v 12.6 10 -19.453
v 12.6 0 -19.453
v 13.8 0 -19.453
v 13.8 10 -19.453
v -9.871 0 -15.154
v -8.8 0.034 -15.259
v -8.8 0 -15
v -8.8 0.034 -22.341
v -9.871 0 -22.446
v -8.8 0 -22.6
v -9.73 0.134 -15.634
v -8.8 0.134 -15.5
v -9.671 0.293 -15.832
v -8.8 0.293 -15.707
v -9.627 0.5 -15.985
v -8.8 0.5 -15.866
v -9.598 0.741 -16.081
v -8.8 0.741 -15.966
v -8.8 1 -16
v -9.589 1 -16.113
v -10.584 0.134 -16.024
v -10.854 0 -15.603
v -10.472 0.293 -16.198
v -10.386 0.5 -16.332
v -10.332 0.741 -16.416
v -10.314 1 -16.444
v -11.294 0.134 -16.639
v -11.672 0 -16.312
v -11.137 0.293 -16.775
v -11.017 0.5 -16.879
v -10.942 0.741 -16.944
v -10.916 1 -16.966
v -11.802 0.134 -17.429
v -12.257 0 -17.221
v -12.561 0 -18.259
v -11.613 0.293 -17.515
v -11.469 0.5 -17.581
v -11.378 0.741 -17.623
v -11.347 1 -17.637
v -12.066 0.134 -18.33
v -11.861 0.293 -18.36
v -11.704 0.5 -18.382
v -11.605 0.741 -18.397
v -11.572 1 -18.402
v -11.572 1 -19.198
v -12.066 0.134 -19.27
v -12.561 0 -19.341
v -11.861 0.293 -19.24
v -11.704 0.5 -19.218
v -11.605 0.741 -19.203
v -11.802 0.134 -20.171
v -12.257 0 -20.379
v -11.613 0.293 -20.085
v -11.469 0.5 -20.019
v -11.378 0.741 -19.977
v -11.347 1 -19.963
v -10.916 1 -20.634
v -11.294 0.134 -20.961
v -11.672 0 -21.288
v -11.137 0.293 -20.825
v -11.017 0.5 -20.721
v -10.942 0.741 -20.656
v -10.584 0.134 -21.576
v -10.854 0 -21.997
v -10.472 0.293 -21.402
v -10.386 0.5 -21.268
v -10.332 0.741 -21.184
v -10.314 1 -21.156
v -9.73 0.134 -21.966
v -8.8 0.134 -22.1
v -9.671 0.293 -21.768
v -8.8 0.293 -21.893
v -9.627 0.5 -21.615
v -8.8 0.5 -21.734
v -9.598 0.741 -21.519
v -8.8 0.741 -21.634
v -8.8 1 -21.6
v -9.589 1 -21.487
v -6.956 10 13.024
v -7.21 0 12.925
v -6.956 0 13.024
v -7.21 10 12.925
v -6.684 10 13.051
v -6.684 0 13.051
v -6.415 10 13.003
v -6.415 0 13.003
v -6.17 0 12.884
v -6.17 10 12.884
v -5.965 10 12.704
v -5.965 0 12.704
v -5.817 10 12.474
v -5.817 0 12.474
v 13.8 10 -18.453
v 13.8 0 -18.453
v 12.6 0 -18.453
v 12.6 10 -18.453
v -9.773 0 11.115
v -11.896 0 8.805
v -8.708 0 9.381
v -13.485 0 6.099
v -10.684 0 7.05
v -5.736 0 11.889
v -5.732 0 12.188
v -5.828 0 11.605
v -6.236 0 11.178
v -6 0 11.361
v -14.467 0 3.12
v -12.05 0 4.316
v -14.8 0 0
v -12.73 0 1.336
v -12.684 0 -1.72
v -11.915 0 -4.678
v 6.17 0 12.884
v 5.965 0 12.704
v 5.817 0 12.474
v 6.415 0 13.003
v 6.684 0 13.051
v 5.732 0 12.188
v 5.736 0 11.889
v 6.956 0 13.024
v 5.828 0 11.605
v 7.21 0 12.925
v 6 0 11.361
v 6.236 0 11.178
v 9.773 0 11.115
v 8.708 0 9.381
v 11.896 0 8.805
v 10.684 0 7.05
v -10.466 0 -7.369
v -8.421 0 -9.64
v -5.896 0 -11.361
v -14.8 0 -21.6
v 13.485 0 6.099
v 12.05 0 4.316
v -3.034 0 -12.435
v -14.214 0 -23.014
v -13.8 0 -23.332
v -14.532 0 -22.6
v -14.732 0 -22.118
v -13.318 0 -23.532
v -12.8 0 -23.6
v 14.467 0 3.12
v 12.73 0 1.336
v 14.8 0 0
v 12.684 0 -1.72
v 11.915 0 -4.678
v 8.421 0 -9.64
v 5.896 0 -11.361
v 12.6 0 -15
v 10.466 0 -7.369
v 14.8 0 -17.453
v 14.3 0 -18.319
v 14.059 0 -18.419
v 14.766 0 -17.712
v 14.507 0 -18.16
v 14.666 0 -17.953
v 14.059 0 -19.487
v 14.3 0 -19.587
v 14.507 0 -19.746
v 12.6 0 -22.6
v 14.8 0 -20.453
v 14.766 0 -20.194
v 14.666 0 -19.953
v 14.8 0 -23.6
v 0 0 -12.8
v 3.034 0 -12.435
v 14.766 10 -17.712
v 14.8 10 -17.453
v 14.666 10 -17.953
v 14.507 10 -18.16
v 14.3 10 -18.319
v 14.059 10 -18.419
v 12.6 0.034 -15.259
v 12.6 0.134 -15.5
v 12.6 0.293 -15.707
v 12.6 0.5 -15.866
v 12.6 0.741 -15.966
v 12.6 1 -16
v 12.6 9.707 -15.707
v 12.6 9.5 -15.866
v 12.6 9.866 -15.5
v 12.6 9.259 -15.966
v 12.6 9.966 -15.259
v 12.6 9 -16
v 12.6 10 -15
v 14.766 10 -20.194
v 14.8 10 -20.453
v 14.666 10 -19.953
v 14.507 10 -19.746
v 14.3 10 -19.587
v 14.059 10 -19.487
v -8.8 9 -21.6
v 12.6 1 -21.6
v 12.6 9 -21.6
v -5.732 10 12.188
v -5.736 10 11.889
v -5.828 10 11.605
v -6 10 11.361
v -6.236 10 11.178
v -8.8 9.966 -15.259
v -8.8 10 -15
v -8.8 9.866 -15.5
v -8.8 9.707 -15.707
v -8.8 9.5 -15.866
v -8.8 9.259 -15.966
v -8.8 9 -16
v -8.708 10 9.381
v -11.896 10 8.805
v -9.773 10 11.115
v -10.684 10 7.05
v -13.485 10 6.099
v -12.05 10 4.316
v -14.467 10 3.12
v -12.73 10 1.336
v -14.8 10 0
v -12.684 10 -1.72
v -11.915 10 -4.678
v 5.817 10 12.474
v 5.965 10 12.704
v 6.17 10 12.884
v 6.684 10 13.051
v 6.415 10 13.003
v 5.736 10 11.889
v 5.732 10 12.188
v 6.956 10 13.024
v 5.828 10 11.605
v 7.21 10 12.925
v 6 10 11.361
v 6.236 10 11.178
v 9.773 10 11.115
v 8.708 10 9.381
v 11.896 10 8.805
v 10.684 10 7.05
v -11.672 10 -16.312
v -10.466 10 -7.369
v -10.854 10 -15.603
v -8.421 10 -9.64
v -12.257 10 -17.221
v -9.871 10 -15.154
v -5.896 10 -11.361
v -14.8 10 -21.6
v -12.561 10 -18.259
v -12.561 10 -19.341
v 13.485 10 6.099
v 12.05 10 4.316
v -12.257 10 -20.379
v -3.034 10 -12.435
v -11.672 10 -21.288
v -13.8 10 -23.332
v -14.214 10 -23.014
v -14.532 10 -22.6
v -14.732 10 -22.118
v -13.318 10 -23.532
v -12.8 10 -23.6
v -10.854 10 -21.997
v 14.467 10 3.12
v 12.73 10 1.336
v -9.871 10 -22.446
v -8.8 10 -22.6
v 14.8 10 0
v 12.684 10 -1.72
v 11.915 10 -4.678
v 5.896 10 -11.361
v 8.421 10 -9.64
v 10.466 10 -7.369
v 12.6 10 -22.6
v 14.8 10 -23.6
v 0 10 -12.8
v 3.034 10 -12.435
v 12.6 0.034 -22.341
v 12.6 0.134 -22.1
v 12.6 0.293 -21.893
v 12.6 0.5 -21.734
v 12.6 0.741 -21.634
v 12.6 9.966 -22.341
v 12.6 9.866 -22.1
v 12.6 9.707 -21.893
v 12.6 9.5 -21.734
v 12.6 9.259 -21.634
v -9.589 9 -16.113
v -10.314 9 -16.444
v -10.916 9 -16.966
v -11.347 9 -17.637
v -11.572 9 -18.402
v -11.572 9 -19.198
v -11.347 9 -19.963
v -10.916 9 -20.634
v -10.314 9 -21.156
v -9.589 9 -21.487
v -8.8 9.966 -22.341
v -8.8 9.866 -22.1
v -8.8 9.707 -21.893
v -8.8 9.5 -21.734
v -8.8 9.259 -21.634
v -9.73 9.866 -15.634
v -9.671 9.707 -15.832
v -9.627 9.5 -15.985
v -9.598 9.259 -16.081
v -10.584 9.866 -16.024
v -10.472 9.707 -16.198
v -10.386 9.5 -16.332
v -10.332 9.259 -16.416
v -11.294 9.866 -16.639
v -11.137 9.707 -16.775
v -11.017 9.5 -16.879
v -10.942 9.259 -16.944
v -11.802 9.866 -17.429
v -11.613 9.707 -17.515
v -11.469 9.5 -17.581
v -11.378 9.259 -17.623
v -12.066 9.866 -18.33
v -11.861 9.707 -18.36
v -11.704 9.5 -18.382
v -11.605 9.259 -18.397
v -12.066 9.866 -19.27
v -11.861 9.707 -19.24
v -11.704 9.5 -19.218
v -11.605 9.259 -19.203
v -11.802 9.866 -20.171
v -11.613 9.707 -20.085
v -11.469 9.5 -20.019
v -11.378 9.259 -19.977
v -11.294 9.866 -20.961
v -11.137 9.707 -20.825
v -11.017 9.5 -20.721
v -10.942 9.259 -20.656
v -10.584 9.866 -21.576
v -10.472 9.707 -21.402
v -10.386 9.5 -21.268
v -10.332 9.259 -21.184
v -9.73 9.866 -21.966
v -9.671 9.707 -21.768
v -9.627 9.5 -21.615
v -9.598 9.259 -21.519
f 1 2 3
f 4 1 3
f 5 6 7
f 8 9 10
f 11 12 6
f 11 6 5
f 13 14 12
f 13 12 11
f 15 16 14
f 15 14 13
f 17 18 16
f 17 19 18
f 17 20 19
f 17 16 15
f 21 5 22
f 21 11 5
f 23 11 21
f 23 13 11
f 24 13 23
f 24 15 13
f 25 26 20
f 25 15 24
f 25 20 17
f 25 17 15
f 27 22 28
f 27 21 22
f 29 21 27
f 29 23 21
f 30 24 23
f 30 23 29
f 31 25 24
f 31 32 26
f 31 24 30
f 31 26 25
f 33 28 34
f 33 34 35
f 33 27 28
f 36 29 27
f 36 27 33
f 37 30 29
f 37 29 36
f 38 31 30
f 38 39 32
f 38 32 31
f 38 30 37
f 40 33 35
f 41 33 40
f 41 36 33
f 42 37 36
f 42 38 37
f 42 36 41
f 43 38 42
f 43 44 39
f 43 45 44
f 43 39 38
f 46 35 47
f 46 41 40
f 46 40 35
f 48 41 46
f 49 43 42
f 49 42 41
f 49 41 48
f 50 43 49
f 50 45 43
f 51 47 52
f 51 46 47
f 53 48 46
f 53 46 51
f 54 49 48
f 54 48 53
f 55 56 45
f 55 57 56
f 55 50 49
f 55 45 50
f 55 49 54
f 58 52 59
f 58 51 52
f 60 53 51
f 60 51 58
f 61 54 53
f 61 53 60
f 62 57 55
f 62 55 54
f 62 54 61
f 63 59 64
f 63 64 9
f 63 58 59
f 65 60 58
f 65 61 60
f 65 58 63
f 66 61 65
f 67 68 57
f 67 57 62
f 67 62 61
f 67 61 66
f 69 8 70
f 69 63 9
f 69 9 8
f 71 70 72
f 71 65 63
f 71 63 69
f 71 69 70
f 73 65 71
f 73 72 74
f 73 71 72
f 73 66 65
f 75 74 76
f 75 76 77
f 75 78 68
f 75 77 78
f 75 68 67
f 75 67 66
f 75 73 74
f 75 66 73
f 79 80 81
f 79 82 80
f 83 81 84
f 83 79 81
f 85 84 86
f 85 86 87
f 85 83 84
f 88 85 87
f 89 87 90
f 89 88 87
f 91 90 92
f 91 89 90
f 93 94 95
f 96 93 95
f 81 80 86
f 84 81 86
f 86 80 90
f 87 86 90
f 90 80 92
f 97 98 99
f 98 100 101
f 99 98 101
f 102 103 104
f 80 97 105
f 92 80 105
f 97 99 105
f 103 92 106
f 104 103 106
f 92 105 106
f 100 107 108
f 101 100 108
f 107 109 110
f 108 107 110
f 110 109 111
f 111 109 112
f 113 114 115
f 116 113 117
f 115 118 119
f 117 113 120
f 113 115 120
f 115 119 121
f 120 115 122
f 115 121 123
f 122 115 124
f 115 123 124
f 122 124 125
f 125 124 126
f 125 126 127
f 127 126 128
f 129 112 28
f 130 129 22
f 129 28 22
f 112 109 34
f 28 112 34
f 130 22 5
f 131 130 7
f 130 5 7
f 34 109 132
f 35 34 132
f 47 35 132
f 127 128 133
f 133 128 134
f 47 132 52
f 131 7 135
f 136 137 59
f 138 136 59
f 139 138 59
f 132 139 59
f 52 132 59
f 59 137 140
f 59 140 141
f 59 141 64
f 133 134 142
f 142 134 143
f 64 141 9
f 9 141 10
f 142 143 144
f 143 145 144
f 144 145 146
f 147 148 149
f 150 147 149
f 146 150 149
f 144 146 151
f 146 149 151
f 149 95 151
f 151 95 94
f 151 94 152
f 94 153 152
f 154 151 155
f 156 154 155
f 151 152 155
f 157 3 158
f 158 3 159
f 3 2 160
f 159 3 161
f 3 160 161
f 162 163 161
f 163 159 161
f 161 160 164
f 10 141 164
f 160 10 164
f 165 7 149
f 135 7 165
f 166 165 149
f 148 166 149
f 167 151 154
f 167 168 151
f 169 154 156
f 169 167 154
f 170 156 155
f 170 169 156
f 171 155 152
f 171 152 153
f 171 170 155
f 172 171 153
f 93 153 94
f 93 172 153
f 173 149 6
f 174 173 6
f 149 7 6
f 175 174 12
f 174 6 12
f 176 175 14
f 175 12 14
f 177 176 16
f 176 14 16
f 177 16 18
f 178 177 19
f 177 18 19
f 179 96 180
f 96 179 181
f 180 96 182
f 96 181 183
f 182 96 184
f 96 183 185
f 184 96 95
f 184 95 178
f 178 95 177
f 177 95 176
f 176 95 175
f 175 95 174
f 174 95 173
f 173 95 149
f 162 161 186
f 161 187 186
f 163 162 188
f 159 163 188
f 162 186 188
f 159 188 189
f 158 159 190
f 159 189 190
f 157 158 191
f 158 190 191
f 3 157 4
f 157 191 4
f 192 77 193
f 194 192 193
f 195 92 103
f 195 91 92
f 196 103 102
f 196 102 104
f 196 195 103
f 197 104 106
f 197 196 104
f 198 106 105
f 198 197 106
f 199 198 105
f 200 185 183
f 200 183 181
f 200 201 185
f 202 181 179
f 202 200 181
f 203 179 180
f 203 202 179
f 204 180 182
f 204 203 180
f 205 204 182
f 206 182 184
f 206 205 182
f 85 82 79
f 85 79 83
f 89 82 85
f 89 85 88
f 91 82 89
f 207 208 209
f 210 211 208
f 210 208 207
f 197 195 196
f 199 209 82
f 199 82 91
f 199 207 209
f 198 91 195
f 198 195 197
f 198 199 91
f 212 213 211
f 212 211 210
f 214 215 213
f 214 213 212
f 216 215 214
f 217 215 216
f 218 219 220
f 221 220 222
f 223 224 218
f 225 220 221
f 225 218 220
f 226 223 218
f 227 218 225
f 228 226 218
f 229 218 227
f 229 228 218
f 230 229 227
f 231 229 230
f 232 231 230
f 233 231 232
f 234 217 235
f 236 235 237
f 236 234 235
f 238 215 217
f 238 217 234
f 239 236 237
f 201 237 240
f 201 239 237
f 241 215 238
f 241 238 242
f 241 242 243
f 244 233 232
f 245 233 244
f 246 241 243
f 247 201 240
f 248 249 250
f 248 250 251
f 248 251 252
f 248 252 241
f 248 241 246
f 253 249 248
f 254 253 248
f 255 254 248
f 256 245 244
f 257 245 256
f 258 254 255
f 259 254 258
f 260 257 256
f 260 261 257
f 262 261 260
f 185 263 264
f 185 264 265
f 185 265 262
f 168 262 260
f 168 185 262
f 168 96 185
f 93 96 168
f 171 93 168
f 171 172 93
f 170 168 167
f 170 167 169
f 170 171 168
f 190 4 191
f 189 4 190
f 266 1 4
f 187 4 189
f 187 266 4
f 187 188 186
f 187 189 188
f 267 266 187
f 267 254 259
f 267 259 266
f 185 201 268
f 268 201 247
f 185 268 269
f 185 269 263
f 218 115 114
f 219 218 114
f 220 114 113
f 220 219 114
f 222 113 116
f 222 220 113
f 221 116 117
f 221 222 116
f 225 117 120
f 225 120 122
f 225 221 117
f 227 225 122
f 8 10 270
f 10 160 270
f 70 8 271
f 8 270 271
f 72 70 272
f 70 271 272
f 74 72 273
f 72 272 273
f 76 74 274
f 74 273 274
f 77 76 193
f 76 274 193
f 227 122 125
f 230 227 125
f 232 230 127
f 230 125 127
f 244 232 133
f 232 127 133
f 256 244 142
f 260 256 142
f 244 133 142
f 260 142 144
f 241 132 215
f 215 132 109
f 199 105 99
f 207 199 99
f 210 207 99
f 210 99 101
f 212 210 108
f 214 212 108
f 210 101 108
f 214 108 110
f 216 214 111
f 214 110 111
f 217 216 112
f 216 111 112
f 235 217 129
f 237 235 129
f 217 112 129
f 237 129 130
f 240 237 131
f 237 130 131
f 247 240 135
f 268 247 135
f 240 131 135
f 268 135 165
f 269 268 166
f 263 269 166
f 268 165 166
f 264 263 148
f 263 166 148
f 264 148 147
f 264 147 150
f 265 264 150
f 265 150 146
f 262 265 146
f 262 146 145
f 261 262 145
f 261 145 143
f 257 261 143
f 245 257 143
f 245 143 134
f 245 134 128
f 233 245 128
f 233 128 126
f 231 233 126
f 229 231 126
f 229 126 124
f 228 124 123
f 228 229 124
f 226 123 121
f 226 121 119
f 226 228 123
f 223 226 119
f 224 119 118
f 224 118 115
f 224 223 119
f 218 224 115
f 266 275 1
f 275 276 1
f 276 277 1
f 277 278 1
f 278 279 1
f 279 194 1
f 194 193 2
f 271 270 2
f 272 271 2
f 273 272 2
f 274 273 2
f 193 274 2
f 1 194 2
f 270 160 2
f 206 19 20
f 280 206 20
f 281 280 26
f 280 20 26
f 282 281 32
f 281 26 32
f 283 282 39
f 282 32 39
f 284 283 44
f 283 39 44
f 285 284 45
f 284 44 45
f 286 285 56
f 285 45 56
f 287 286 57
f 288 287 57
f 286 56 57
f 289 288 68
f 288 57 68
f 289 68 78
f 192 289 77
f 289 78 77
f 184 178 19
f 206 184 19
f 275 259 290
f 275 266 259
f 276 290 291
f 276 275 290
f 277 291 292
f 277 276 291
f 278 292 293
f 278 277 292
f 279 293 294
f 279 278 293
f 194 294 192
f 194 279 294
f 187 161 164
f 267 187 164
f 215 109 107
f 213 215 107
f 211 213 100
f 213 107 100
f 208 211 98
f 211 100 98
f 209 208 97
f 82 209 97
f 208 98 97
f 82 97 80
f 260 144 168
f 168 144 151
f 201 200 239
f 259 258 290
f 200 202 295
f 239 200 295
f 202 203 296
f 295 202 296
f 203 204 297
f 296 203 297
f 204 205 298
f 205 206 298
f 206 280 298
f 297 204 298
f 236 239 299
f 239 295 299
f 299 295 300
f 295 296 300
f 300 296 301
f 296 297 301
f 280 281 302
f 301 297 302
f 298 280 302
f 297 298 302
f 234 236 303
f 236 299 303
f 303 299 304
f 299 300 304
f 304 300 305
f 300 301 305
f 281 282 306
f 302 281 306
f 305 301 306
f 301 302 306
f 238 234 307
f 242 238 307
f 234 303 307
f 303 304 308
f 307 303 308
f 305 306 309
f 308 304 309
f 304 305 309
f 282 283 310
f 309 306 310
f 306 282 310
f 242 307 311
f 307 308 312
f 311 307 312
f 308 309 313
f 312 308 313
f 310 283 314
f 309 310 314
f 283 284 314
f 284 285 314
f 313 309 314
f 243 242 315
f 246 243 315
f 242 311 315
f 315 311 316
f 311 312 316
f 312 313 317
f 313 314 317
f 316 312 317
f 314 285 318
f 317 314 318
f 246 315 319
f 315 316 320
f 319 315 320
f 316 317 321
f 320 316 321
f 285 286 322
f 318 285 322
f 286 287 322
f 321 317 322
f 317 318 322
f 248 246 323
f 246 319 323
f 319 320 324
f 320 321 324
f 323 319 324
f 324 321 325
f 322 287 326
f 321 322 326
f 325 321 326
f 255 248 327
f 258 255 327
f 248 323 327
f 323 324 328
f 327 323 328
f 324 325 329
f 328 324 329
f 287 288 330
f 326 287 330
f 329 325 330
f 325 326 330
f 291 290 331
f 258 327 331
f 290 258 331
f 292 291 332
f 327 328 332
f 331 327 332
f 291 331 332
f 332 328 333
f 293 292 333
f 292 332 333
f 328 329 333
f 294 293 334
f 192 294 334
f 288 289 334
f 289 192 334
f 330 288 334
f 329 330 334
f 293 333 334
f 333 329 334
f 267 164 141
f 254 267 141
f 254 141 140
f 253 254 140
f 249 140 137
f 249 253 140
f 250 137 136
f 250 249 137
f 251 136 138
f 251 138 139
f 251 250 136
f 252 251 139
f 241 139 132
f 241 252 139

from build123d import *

# Parameters (mm, degrees)
BOSS_EXTRUDE1_DEPTH = 10
FILLET1_R           = 2
FILLET2_R           = 1


with BuildPart() as part:
    # Sketch2 → Boss-Extrude1 (new body)
    with BuildSketch(Plane(origin=(0, 0, 0), x_dir=(1, 0, 0), z_dir=(0, 1, 0))):
        with BuildLine():
            ThreePointArc((-14.8, 0), (-12.482193398, -7.952034204), (-6.254750274, -13.413355248))
            Line((-6.254750274, -13.413355248), (-5.40951375, -11.600739674))
            ThreePointArc((-5.40951375, -11.600739674), (0, 12.8), (5.40951375, -11.600739674))
            Line((5.40951375, -11.600739674), (6.254750274, -13.413355248))
            ThreePointArc((6.254750274, -13.413355248), (12.482193398, -7.952034204), (14.8, 0))
            Line((14.8, 0), (14.8, 18.453160221))
            Line((14.8, 18.453160221), (12.6, 18.453160221))
            Line((12.6, 18.453160221), (12.6, 16))
            Line((12.6, 16), (-8.8, 16))
            ThreePointArc((-8.8, 16), (-11.6, 18.8), (-8.8, 21.6))
            Line((-8.8, 21.6), (12.6, 21.6))
            Line((12.6, 21.6), (12.6, 19.453160221))
            Line((12.6, 19.453160221), (14.8, 19.453160221))
            Line((14.8, 19.453160221), (14.8, 23.6))
            Line((14.8, 23.6), (-14.8, 23.6))
            Line((-14.8, 23.6), (-14.8, 0))
        make_face()
    extrude(amount=BOSS_EXTRUDE1_DEPTH)

    # Fillet1
    fillet1_edges = [part.edges().sort_by_distance(p)[0] for p in [
        (-14.8, 5, -23.6),
    ]]
    fillet(fillet1_edges, radius=FILLET1_R)

    # Fillet2
    fillet2_edges = [part.edges().sort_by_distance(p)[0] for p in [
        (1.9, 0, -21.6),
        (1.9, 10, -21.6),
        (-11.6, 0, -18.8),
        (-11.6, 10, -18.8),
        (1.9, 0, -16),
        (1.9, 10, -16),
        (14.8, 5, -19.453160221),
        (14.8, 5, -18.453160221),
        (5.40951375, 5, 11.600739674),
        (6.254750274, 5, 13.413355248),
        (-6.254750274, 5, 13.413355248),
        (-5.40951375, 5, 11.600739674),
    ]]
    fillet(fillet2_edges, radius=FILLET2_R - 0.0001)  # a hair under: the kernel refuses the full size


solid = part.part
